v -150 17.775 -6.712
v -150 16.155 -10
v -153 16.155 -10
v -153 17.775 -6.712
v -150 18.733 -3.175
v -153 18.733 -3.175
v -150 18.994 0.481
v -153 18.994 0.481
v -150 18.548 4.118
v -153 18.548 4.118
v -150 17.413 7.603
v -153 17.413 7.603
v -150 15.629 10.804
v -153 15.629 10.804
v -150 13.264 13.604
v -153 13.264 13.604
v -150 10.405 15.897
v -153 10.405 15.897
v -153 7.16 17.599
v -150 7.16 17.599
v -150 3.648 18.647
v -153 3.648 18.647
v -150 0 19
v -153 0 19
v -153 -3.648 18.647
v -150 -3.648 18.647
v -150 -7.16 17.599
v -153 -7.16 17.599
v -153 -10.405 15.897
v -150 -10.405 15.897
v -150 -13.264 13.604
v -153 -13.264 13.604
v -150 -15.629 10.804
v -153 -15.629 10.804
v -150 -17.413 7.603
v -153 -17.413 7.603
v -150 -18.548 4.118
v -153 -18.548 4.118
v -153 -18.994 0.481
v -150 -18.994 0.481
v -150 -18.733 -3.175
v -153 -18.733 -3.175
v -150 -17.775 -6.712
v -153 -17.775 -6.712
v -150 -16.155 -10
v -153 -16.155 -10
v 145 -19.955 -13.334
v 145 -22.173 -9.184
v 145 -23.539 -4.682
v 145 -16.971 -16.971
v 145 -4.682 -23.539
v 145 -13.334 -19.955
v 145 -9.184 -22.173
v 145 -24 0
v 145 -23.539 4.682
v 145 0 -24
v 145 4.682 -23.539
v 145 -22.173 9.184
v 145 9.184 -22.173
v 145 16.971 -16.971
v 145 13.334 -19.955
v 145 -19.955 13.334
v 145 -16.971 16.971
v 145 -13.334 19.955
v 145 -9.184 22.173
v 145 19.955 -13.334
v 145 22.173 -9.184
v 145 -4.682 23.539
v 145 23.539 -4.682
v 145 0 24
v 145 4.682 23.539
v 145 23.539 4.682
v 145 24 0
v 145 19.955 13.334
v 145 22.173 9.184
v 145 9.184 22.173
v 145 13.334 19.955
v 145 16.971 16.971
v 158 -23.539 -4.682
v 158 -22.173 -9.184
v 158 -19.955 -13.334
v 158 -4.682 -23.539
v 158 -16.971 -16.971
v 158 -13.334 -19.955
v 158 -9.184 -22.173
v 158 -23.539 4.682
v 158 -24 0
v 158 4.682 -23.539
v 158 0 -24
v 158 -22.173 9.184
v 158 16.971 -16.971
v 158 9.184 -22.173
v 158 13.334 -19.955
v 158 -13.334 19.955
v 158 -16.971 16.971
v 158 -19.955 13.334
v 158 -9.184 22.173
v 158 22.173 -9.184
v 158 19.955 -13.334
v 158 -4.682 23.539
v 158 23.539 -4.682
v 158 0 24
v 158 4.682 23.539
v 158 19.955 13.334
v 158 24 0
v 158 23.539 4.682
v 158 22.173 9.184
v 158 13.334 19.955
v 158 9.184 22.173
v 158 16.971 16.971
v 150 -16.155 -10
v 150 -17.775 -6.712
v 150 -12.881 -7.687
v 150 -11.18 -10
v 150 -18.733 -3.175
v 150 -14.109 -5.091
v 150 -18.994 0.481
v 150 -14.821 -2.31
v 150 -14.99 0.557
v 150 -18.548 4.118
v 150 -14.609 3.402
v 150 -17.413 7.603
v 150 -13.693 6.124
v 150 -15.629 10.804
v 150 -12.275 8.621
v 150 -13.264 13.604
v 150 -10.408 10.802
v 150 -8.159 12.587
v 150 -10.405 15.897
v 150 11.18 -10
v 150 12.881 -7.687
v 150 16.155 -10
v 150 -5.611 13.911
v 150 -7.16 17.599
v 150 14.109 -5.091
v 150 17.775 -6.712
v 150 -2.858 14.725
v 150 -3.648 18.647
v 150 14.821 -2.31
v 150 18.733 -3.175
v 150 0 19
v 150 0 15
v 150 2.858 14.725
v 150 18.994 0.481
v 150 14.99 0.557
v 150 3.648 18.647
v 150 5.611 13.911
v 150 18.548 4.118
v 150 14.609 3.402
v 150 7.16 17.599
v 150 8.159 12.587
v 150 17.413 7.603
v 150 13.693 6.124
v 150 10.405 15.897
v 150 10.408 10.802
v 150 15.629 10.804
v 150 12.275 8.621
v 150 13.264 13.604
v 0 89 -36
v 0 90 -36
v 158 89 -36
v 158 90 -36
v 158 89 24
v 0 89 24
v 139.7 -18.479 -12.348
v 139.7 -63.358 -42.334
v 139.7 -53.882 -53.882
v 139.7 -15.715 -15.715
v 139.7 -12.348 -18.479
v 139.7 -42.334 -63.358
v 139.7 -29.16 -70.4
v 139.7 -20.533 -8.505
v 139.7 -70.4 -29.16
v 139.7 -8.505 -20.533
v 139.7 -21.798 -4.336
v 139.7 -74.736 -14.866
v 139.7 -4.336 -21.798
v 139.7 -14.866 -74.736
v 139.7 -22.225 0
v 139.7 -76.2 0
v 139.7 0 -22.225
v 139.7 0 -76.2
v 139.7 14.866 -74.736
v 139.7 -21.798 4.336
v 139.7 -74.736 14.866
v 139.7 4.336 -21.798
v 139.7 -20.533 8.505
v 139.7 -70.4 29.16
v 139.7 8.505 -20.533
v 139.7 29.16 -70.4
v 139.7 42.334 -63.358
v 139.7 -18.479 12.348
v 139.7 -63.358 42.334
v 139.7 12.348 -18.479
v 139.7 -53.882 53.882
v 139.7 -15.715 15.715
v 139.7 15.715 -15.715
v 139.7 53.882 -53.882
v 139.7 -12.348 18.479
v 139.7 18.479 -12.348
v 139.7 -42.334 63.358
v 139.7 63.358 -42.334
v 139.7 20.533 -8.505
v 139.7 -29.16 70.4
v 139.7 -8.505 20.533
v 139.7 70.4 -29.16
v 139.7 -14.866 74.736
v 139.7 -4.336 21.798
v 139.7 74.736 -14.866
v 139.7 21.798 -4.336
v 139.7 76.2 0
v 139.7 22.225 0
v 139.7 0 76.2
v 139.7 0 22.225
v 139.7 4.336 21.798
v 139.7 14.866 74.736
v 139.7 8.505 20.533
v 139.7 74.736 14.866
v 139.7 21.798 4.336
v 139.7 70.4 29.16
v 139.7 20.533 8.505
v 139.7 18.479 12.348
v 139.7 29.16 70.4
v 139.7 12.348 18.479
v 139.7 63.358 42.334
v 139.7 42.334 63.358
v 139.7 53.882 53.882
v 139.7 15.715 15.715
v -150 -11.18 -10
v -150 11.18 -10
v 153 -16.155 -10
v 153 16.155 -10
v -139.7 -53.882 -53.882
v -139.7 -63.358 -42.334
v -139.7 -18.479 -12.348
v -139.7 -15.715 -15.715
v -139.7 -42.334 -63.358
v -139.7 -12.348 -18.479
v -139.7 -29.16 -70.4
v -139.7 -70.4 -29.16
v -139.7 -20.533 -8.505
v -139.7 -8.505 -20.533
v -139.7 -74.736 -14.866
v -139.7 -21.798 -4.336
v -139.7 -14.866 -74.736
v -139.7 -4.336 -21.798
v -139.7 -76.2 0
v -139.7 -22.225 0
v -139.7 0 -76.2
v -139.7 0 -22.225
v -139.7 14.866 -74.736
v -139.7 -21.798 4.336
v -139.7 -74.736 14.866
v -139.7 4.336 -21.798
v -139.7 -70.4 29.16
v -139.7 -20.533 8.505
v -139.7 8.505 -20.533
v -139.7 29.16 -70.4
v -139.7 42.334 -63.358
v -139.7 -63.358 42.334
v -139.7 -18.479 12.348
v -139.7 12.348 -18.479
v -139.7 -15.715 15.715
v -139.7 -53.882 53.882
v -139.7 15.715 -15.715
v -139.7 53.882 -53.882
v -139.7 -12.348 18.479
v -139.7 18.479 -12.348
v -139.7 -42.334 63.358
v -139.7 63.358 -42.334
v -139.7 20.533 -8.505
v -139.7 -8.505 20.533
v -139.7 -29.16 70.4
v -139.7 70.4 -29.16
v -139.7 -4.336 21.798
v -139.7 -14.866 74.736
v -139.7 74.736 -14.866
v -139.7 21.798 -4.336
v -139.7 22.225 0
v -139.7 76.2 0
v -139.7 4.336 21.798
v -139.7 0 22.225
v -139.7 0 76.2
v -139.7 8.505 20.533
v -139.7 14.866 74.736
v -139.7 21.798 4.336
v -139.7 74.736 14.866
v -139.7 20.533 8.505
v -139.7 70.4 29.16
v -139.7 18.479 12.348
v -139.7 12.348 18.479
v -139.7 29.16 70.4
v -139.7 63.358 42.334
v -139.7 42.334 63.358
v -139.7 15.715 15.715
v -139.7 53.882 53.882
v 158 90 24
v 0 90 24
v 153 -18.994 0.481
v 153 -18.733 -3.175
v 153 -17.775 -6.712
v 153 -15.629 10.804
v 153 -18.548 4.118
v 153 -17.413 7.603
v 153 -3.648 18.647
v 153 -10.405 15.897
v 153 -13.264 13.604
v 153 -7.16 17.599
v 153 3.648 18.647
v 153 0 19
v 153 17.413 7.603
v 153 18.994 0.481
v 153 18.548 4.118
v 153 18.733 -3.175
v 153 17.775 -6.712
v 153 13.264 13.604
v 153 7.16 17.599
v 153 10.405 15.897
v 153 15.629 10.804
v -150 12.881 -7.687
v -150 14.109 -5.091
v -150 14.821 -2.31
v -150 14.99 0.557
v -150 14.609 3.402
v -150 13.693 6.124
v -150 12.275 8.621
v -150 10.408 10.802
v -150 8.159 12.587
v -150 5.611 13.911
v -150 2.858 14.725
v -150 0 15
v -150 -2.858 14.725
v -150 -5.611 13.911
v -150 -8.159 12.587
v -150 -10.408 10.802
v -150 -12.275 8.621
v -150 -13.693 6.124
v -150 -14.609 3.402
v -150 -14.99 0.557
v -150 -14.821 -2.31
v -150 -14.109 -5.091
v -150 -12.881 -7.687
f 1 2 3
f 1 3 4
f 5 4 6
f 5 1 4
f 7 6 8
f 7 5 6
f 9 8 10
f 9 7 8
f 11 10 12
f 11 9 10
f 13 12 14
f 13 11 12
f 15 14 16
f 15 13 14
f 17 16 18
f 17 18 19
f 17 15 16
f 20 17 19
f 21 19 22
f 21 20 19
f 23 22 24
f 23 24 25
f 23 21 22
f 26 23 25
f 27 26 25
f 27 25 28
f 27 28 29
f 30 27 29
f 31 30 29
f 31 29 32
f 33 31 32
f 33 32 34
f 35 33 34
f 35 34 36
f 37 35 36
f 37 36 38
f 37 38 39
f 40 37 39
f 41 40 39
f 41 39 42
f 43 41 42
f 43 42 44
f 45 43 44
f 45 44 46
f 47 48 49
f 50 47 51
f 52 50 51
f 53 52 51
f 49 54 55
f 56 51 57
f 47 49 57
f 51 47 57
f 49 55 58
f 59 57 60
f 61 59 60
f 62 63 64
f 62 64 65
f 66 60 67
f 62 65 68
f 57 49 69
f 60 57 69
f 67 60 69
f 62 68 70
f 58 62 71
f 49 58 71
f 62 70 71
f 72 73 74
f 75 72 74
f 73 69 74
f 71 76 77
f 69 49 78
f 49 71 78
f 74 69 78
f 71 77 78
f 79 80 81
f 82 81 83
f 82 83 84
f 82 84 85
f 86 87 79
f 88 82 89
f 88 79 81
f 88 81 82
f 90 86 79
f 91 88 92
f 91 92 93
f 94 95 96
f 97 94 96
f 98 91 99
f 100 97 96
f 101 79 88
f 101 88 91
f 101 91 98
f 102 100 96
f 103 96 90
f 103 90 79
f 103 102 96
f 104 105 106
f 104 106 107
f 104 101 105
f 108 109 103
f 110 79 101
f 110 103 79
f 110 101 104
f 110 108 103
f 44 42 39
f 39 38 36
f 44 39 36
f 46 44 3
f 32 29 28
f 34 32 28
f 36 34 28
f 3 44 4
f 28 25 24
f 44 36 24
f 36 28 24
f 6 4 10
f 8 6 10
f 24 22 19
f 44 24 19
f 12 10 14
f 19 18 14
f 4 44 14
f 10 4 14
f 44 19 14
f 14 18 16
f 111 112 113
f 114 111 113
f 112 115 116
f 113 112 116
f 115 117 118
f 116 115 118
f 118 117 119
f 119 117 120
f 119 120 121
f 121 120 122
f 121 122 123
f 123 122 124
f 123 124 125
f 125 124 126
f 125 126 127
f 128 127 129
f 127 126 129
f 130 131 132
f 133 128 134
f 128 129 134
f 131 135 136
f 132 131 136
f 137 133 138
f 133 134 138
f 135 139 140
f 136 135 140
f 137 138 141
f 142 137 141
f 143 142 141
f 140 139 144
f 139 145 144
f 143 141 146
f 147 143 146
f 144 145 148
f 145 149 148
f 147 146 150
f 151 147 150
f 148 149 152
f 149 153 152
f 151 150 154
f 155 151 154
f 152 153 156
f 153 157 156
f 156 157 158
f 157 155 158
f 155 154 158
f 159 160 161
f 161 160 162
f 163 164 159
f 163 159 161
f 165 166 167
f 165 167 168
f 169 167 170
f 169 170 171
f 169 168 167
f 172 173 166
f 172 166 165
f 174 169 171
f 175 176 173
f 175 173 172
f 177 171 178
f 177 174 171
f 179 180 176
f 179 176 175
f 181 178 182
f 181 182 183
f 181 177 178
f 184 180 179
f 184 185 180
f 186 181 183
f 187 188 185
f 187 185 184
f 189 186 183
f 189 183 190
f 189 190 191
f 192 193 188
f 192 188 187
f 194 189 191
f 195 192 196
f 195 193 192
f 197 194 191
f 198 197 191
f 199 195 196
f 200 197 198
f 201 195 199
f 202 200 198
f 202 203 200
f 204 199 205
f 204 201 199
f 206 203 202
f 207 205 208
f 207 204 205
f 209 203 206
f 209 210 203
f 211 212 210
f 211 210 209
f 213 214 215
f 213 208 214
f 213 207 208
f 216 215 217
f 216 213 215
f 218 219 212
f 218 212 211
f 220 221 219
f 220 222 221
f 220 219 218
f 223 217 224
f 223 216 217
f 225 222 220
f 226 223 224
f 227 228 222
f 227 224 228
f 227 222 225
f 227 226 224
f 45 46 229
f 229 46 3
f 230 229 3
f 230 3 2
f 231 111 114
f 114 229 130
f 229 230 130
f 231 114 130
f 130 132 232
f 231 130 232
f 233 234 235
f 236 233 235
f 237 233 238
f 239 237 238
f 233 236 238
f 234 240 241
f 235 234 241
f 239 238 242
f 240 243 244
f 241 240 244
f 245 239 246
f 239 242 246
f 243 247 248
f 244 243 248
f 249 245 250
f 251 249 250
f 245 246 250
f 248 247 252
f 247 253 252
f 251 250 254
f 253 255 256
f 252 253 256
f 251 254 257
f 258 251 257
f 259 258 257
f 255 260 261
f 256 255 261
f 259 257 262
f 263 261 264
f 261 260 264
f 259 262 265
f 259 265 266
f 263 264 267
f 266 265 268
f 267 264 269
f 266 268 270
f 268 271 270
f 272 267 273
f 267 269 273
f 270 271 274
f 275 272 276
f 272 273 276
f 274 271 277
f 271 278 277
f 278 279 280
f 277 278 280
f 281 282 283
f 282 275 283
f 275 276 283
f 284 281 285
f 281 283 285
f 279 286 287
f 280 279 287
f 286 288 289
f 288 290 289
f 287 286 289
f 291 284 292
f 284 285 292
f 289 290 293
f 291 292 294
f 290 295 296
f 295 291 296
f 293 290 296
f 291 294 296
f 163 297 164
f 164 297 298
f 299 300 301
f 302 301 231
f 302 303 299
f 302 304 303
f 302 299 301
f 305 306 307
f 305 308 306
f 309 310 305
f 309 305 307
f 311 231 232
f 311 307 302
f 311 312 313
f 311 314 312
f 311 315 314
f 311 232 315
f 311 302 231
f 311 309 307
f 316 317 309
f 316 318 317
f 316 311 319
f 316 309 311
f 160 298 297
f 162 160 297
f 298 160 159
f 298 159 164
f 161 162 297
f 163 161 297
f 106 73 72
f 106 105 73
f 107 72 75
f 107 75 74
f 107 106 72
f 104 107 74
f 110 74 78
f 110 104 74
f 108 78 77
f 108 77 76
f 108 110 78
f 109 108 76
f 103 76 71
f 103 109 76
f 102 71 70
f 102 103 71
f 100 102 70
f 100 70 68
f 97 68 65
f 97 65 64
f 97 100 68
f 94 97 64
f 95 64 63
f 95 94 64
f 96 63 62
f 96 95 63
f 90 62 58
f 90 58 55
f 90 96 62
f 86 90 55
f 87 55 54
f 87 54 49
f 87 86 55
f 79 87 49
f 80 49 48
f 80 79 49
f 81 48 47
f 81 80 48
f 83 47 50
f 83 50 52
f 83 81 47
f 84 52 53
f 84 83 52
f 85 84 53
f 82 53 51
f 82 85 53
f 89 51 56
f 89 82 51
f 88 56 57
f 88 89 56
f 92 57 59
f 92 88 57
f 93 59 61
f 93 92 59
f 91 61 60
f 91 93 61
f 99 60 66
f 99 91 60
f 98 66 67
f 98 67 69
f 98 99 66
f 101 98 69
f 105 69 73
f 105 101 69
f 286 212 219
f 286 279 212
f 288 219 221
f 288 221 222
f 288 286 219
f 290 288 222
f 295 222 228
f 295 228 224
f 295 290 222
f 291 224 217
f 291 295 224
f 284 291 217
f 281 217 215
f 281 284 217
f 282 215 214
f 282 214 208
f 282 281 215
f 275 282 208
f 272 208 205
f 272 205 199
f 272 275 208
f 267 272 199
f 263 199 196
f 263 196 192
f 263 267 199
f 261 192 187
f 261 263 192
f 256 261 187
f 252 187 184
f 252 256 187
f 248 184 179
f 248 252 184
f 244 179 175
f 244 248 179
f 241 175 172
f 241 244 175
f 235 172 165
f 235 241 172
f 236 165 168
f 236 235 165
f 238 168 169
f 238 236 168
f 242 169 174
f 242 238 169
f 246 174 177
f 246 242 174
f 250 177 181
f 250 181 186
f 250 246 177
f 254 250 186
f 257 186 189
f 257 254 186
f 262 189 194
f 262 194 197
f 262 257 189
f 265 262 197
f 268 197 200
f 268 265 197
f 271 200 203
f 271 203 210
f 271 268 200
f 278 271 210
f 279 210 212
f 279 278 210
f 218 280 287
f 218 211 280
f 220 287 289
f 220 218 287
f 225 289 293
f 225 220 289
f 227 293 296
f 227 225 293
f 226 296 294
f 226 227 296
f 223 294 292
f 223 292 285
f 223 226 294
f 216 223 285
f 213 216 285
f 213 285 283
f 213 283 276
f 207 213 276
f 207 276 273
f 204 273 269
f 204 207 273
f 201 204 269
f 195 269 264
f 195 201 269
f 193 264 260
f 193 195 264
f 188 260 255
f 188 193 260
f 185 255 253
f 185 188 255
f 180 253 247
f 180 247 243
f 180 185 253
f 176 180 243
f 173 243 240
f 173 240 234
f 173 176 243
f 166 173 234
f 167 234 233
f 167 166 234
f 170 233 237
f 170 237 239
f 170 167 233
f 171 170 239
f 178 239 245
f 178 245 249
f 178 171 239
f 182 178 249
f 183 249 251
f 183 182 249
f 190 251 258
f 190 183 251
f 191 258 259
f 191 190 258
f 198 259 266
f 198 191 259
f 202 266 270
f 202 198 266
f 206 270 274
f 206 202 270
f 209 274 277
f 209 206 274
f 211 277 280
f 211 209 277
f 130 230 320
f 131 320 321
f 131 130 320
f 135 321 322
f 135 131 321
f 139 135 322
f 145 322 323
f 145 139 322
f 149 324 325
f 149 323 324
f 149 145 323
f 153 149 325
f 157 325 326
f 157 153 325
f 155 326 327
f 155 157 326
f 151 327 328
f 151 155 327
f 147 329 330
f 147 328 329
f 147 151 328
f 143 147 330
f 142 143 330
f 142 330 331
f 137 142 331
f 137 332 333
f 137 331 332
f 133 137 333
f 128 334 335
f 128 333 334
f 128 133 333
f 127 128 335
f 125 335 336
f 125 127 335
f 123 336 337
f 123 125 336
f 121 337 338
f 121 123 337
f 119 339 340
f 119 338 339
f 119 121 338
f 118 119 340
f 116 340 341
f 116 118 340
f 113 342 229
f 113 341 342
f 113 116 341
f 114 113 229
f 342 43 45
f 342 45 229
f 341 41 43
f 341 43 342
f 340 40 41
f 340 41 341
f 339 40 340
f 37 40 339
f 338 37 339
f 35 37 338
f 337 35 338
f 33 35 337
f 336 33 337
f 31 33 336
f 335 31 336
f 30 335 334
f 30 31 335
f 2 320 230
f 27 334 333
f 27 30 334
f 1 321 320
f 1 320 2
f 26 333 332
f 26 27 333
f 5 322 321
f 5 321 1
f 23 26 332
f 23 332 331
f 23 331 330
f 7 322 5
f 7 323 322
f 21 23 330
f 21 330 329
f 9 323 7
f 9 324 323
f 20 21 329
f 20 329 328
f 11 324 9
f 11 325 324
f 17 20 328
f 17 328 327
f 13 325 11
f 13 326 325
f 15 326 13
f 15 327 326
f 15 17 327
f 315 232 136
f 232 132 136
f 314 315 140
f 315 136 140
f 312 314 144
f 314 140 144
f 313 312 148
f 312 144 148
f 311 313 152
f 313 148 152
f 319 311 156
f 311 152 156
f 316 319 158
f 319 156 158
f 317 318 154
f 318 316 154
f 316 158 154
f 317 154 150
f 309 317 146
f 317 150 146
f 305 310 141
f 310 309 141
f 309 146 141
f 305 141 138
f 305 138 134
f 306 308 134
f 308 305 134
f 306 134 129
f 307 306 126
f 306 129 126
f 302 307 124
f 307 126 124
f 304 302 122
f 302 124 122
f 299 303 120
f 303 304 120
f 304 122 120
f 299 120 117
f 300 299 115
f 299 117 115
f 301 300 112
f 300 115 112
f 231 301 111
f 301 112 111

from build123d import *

# Parameters (mm, degrees)
F0_R           = 76.2
F0_R_2         = 22.225
F1_DEPTH       = 139.7
F0_R_3         = 15
F2_DEPTH       = 150
F3_START       = 150
F0_R_4         = 19
F3_DEPTH       = 3
F6_W           = 431.7707419395
F6_H           = 281.149558723
F7_DEPTH       = 25
F9_W           = 13
F9_H           = 60
F9_W_2         = 3
F9_H_2         = 29
F9_W_3         = 145
F10_DEPTH      = 1
F11_R          = 24
F12_DEPTH      = 5
F12_DEPTH_BACK = 8


with BuildPart() as f1:
    # F0 (on Right) → F1 (new body, symmetric)
    with BuildSketch(Plane.YZ):
        Circle(F0_R)
        Circle(F0_R_2, mode=Mode.SUBTRACT)
    extrude(amount=F1_DEPTH, both=True)


with BuildPart() as f2:
    # F0 (on Right) → F2 (new body)
    with BuildSketch(Plane.YZ):
        Circle(F0_R_3)
    extrude(amount=F2_DEPTH)

    # F0 (on Right) → F3 (join)
    with BuildSketch(Plane.YZ.offset(F3_START)):
        Circle(F0_R_4)
        Circle(F0_R_3, mode=Mode.SUBTRACT)
        Circle(F0_R_3)
    extrude(amount=F3_DEPTH)

    # F4: F2 across face


with BuildPart() as f2_1:
    add(f2.part)
    add(f2.part.mirror(Plane.YZ))

    # F6 (on offset) → F7 (cut)
    with BuildSketch(Plane.XY.offset(-10)):
        with Locations((0, 19.5408351719)):
            Rectangle(F6_W, F6_H)
    extrude(amount=-F7_DEPTH, mode=Mode.SUBTRACT)


with BuildPart() as f10:
    # F9 (on offset) → F10 (new body)
    with BuildSketch(Plane.XZ.offset(-90)):
        with Locations((151.5, -6)):
            Rectangle(F9_W, F9_H)
        with Locations((151.5, 4.5)):
            Rectangle(F9_W_2, F9_H_2, mode=Mode.SUBTRACT)
        with Locations((151.5, 4.5)):
            Rectangle(F9_W_2, F9_H_2)
        with Locations((72.5, -6)):
            Rectangle(F9_W_3, F9_H)
    extrude(amount=F10_DEPTH)


with BuildPart() as f12:
    # F11 (on face) → F12 (new body, two sides)
    with BuildSketch(Plane.YZ.offset(153)) as f12_sk:
        Circle(F11_R)
        with BuildLine():
            ThreePointArc((-16.1554944214, -10), (0, 19), (16.1554944214, -10))
            Line((16.1554944214, -10), (-16.1554944214, -10))
        make_face(mode=Mode.SUBTRACT)
        with BuildLine():
            Line((-16.1554944214, -10), (16.1554944214, -10))
            ThreePointArc((16.1554944214, -10), (0, 19), (-16.1554944214, -10))
        make_face()
    extrude(amount=F12_DEPTH)
    extrude(f12_sk.sketch, amount=-F12_DEPTH_BACK)


solid = Compound([f1.part, f2_1.part, f10.part, f12.part])
